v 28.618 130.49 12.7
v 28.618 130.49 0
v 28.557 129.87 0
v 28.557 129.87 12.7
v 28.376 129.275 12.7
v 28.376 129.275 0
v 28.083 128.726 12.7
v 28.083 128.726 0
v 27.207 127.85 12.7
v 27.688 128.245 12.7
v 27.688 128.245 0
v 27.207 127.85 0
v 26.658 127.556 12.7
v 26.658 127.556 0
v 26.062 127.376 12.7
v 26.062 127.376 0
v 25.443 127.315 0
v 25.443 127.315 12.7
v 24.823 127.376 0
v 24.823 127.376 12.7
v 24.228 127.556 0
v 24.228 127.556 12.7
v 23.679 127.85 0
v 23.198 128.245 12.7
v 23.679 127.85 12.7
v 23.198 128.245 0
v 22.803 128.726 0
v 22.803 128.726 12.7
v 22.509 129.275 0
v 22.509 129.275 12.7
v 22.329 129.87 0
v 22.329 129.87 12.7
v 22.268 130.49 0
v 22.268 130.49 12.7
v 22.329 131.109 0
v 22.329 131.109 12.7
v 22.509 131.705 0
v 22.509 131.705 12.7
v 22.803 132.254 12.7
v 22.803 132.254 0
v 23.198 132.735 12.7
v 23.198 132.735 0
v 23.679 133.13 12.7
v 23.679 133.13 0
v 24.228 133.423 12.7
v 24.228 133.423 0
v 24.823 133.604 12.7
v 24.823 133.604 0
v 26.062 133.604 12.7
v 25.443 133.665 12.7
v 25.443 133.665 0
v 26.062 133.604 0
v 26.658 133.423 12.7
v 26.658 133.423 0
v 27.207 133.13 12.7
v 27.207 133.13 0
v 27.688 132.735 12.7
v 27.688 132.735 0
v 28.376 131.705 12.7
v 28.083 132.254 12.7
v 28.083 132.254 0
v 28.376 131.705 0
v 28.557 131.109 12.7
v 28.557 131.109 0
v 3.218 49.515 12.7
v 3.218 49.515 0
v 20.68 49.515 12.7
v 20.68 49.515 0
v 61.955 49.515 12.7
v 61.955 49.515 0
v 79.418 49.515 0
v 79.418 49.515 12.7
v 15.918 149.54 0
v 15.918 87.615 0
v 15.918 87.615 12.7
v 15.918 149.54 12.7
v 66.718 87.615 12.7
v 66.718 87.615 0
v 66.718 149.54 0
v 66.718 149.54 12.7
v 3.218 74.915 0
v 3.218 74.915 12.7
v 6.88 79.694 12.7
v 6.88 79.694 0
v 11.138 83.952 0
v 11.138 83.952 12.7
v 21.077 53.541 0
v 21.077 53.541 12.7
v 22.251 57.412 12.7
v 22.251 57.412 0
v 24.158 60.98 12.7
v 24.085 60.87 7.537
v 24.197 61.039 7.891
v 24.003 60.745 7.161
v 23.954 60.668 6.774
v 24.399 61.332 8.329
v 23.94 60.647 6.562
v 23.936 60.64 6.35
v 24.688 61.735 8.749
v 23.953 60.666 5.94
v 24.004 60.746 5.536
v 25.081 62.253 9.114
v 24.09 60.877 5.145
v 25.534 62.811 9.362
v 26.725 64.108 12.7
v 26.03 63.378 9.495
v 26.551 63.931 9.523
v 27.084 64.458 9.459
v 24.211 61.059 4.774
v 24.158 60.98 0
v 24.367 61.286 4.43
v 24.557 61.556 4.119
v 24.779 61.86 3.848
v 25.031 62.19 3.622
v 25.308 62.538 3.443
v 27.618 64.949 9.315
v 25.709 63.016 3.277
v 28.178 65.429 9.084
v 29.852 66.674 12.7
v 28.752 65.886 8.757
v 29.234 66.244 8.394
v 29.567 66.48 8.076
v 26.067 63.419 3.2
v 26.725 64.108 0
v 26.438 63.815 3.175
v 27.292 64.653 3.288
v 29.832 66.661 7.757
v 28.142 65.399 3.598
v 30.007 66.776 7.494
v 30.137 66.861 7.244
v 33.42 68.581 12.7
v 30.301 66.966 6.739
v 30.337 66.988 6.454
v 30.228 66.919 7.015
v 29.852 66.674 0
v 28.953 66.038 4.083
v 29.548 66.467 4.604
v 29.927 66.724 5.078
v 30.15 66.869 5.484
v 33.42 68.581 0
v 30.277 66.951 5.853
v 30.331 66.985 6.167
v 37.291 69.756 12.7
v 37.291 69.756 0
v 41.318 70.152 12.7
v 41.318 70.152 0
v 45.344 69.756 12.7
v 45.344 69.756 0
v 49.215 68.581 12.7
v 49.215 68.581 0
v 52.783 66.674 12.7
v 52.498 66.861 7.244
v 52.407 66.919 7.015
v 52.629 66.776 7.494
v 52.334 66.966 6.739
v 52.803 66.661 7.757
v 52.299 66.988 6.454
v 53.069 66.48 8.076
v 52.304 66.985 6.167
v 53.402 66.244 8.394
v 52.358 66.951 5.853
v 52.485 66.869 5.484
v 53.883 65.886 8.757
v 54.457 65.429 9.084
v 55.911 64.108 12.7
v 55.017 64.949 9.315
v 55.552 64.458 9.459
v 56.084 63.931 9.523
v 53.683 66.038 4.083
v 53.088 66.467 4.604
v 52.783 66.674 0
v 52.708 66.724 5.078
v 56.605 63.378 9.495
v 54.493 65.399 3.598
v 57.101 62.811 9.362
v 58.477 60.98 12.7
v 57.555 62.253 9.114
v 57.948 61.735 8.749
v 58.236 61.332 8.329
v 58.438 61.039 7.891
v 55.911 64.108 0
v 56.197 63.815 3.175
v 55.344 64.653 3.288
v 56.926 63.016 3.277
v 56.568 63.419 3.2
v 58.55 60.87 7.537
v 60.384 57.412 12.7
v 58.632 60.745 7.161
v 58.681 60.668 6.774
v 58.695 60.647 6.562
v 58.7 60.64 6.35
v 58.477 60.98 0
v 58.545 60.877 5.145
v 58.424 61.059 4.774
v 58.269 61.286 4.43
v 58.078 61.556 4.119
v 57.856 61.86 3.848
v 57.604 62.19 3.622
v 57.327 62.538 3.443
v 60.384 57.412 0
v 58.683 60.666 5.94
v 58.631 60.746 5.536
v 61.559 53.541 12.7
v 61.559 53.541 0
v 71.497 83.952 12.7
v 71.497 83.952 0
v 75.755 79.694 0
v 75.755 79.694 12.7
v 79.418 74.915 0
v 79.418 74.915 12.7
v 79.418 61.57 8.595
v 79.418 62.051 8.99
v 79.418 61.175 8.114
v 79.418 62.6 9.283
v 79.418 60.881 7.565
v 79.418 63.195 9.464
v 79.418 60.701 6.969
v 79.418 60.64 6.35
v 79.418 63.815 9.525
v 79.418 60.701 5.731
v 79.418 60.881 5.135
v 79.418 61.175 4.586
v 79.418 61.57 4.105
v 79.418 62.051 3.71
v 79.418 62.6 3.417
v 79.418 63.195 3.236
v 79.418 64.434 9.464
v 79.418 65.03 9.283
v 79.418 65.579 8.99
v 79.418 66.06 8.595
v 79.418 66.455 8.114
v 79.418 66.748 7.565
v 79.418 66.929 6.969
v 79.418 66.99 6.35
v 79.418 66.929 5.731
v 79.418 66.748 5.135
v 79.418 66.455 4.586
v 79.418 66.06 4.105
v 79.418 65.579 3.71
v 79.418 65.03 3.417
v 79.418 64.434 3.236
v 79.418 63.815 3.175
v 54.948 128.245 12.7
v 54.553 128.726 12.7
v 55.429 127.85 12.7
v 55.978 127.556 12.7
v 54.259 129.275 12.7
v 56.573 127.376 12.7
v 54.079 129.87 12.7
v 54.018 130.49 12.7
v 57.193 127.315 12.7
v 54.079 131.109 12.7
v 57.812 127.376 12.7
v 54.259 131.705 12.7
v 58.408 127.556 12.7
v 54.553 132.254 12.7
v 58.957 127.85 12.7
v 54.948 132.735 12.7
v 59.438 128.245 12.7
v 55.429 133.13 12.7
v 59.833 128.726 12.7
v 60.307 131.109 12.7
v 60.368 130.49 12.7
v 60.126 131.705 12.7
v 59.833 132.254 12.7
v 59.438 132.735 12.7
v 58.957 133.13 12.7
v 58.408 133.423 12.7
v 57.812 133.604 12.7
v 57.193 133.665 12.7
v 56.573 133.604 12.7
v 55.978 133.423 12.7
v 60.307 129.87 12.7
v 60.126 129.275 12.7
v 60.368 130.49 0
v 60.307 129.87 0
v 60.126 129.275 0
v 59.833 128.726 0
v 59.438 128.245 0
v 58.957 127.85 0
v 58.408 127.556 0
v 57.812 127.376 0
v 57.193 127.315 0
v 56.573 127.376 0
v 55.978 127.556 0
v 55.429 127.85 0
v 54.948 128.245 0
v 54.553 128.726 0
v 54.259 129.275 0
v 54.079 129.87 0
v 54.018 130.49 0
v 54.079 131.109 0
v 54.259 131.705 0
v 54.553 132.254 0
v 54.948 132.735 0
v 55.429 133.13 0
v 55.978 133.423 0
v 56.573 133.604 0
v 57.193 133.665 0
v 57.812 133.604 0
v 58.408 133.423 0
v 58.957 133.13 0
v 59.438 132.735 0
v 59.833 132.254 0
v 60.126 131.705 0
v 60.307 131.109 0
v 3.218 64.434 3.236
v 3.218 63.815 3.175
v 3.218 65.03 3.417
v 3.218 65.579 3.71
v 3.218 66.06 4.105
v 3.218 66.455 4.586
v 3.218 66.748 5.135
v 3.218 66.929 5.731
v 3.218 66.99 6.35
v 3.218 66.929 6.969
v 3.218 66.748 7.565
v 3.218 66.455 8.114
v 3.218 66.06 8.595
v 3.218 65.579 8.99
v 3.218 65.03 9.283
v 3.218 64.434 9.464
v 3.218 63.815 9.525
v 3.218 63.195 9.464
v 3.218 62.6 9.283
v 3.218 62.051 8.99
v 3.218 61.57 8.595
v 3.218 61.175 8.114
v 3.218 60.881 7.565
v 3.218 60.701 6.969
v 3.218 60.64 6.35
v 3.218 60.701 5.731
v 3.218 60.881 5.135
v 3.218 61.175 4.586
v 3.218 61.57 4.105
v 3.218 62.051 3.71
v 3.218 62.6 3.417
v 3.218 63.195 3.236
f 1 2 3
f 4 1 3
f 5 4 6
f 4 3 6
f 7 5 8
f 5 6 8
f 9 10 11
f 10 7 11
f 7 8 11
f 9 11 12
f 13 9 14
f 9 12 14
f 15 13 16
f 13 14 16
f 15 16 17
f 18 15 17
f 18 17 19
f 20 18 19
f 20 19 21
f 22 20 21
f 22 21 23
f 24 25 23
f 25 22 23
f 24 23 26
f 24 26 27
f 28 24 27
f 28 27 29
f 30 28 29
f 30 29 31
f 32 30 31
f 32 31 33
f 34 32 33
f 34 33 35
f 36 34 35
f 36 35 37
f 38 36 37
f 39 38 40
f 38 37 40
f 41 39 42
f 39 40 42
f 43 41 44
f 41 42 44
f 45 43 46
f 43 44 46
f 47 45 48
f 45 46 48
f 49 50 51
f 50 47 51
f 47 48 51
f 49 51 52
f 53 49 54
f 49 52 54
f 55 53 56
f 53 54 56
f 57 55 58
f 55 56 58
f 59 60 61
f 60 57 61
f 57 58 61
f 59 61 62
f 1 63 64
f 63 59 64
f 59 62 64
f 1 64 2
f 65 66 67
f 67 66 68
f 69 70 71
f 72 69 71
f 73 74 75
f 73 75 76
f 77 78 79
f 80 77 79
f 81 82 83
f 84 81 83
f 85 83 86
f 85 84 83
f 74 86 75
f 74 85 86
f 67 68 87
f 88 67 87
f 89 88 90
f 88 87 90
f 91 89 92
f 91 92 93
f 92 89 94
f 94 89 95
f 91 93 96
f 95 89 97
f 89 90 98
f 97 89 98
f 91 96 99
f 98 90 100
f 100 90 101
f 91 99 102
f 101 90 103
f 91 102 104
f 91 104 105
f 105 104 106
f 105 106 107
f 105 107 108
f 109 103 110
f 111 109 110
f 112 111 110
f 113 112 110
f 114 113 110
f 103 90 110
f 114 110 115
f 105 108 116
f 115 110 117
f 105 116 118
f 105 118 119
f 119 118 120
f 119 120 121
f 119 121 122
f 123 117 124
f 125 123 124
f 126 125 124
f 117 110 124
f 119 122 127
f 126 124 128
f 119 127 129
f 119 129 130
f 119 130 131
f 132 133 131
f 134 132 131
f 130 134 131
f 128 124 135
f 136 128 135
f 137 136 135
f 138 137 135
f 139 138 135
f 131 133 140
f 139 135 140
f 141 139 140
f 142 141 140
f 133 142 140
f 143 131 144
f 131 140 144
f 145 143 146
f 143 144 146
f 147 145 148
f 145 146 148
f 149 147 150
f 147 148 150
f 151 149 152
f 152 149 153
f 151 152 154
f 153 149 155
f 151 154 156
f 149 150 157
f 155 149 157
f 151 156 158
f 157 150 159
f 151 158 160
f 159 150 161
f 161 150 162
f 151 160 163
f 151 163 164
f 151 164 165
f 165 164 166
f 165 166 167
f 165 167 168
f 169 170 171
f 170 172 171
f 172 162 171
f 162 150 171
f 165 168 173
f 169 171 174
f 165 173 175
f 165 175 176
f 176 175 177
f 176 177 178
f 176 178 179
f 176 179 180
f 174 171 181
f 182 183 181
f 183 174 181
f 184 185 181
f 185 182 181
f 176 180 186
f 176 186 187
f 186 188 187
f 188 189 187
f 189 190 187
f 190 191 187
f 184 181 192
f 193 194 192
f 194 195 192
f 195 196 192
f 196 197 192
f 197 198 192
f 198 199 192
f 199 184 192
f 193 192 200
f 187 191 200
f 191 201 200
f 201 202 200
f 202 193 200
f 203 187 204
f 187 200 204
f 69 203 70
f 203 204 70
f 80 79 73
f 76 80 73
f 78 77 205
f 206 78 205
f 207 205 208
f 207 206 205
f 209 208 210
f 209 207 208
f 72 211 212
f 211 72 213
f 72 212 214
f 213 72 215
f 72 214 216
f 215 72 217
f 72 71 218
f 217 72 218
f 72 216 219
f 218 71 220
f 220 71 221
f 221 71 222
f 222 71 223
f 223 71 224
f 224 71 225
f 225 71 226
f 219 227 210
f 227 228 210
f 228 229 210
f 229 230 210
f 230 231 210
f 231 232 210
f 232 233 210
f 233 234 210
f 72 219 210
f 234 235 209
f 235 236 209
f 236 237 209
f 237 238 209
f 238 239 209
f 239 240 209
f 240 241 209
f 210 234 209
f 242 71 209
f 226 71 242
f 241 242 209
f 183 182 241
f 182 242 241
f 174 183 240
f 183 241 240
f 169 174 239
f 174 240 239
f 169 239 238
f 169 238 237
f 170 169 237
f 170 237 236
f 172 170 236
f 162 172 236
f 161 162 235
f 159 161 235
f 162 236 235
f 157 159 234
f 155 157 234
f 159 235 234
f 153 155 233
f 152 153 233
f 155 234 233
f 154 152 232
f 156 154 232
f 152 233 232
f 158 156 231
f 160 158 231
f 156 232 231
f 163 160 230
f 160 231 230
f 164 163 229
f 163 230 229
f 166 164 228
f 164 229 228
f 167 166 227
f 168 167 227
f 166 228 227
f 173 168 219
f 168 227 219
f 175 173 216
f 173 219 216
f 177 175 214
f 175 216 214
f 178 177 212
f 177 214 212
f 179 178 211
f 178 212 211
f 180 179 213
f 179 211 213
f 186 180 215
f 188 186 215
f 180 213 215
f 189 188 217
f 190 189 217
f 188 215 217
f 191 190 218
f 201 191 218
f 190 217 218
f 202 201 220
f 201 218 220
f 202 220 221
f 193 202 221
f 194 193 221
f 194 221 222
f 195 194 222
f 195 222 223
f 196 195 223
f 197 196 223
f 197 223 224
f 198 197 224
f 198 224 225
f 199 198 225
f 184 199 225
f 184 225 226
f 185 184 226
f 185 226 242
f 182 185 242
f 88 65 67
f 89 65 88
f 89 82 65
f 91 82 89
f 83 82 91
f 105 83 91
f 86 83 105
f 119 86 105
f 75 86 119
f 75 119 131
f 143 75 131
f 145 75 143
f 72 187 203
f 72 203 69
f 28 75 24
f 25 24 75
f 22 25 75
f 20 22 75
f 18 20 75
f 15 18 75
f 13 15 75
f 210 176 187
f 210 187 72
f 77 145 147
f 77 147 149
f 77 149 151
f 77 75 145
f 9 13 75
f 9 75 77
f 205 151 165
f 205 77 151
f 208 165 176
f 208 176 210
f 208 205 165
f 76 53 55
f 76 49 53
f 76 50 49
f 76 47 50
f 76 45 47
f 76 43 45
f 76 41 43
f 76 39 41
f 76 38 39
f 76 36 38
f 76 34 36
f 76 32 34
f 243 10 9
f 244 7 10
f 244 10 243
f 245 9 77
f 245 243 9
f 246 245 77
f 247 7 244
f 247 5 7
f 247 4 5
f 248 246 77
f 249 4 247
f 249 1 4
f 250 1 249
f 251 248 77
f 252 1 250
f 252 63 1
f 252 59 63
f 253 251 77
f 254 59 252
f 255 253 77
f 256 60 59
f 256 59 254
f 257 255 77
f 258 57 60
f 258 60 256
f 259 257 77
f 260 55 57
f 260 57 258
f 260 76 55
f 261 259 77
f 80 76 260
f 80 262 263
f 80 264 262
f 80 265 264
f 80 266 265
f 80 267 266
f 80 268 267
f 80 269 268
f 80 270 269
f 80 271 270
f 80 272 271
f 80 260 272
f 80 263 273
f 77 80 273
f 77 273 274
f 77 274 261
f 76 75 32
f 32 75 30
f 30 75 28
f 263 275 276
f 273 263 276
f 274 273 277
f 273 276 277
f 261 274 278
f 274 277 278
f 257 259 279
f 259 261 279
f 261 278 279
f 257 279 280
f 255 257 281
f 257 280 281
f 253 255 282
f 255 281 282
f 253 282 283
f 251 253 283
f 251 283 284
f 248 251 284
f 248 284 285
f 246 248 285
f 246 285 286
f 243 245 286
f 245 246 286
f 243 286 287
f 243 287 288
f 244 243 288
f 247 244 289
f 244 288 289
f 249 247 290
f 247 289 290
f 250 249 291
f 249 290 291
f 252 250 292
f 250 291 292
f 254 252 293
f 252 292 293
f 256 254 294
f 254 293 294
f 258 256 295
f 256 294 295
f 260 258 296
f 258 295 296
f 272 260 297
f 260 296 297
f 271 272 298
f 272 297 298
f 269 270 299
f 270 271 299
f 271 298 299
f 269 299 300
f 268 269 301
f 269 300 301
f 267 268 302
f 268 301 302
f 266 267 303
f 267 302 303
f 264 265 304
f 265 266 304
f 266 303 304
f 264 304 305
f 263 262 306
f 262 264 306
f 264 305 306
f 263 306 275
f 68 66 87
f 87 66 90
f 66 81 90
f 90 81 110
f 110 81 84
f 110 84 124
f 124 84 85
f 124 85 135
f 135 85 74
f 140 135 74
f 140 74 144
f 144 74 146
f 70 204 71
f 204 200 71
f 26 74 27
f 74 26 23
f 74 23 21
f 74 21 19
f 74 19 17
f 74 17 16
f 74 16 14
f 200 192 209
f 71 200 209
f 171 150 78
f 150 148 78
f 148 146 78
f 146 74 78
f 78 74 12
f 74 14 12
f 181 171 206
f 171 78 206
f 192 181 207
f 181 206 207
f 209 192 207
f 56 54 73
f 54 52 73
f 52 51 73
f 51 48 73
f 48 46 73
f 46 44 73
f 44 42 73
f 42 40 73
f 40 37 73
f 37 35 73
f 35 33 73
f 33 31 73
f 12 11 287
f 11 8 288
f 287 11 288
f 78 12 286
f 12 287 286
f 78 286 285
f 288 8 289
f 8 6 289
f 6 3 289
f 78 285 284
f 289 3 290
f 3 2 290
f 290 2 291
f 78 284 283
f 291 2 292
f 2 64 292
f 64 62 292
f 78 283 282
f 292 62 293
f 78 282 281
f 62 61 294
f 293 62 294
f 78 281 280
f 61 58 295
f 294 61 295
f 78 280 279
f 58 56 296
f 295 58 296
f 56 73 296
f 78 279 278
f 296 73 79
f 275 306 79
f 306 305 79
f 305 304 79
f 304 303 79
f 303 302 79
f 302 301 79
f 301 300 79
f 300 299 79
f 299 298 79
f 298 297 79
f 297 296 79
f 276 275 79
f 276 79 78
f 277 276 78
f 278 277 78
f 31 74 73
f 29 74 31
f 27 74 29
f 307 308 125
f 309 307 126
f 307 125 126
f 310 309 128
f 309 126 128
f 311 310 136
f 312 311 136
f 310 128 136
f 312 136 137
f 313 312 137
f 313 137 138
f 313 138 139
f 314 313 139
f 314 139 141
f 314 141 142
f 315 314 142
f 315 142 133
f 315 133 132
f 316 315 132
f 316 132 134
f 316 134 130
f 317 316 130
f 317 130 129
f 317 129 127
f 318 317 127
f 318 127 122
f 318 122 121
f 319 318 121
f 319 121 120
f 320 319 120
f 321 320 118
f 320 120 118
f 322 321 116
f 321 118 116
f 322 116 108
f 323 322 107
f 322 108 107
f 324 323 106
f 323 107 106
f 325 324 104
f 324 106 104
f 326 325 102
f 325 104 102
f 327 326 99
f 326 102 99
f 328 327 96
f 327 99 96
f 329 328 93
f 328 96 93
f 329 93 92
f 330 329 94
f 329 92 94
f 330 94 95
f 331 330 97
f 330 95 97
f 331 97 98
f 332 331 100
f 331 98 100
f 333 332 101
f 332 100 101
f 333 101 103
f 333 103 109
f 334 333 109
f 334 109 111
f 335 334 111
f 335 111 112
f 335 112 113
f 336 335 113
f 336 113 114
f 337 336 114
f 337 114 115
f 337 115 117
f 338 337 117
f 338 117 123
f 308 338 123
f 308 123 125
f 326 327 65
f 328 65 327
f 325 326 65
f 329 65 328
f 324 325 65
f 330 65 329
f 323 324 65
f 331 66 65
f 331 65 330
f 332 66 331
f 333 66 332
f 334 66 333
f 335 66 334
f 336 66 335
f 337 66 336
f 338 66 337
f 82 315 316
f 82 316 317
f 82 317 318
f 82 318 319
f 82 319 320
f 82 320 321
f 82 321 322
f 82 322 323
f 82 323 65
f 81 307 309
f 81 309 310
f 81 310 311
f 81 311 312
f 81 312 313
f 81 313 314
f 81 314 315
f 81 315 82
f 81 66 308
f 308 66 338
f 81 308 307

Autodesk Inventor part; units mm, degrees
ref_plane "YZ Plane" through (0, 0, 0) normal (1, 0, 0) x (0, 1, 0)
ref_plane "XZ Plane" through (0, 0, 0) normal (0, 1, 0) x (-1, 0, 0)
ref_plane "XY Plane" through (0, 0, 0) normal (0, 0, 1) x (1, 0, 0)
sketch "Sketch1" plane through (0, 0, 0) normal (0, 0, 1) x (1, 0, 0)
  circle A0 centre (25.4426, 130.4898) radius 3.175
  circle A1 centre (57.1926, 130.4898) radius 3.175
  line L0 (55.6051, 149.5398) -> (27.0301, 149.5398)
  line L1 (41.3176, 149.5398) -> (41.3176, 49.5146)
  arc A2 (61.9551, 49.5146) -> (20.6801, 49.5146) centre (41.3176, 49.5146) ccw
  line L2 (66.7176, 87.6146) -> (66.7176, 149.5398)
  line L3 (15.9176, 87.6146) -> (15.9176, 149.5398)
  line L4 (79.4176, 49.5146) -> (79.4176, 72.4098)
  line L5 (3.2176, 49.5146) -> (3.2176, 72.4098)
  line L6 (66.7176, 149.5398) -> (15.9176, 149.5398)
  line L7 (3.2176, 49.5146) -> (79.4176, 49.5146)
  line L8 (79.4176, 49.5146) -> (79.4176, 74.9146)
  line L9 (3.2176, 49.5146) -> (3.2176, 74.9146)
  arc A3 (15.9176, 87.6146) -> (3.2176, 74.9146) centre (41.3176, 49.5146) ccw
  arc A4 (79.4176, 74.9146) -> (66.7176, 87.6146) centre (41.3176, 49.5146) ccw
  point P0 (27.0301, 149.5398)
  dimension "d2" = 6.35
  dimension "d3" = 6.35
  dimension "d6" = 100.0252
  dimension "d7" = 41.275
  dimension "d18" = 19.05
  dimension "d19" = 19.05
  dimension "d20" = 25.4
  dimension "d21" = 25.4
extrude "Extrusion3" add sketch "Sketch1" along normal blind 12.7 contours L6 L2 A4 L8 L4 L7 A2 L1 L0 | L1 A2 L7 L5 L9 A3 L3 L6 L0
sketch "Sketch2" plane through (79.4176, 49.5146, 0) normal (1, 0, 0) x (0, 0, -1)
  line L0 (0, 0) -> (-12.7, 0) projected
  line L1 (-6.35, 0) -> (-6.35, 14.3002)
  circle A0 centre (-6.35, 14.3002) radius 3.175
  point P0 (0, -49.5146)
  dimension "d24" = 14.3002
  dimension "d25" = 6.35
extrude "Extrusion4" cut sketch "Sketch2" against normal blind 125.4125
properties part number "Frame Middle"
